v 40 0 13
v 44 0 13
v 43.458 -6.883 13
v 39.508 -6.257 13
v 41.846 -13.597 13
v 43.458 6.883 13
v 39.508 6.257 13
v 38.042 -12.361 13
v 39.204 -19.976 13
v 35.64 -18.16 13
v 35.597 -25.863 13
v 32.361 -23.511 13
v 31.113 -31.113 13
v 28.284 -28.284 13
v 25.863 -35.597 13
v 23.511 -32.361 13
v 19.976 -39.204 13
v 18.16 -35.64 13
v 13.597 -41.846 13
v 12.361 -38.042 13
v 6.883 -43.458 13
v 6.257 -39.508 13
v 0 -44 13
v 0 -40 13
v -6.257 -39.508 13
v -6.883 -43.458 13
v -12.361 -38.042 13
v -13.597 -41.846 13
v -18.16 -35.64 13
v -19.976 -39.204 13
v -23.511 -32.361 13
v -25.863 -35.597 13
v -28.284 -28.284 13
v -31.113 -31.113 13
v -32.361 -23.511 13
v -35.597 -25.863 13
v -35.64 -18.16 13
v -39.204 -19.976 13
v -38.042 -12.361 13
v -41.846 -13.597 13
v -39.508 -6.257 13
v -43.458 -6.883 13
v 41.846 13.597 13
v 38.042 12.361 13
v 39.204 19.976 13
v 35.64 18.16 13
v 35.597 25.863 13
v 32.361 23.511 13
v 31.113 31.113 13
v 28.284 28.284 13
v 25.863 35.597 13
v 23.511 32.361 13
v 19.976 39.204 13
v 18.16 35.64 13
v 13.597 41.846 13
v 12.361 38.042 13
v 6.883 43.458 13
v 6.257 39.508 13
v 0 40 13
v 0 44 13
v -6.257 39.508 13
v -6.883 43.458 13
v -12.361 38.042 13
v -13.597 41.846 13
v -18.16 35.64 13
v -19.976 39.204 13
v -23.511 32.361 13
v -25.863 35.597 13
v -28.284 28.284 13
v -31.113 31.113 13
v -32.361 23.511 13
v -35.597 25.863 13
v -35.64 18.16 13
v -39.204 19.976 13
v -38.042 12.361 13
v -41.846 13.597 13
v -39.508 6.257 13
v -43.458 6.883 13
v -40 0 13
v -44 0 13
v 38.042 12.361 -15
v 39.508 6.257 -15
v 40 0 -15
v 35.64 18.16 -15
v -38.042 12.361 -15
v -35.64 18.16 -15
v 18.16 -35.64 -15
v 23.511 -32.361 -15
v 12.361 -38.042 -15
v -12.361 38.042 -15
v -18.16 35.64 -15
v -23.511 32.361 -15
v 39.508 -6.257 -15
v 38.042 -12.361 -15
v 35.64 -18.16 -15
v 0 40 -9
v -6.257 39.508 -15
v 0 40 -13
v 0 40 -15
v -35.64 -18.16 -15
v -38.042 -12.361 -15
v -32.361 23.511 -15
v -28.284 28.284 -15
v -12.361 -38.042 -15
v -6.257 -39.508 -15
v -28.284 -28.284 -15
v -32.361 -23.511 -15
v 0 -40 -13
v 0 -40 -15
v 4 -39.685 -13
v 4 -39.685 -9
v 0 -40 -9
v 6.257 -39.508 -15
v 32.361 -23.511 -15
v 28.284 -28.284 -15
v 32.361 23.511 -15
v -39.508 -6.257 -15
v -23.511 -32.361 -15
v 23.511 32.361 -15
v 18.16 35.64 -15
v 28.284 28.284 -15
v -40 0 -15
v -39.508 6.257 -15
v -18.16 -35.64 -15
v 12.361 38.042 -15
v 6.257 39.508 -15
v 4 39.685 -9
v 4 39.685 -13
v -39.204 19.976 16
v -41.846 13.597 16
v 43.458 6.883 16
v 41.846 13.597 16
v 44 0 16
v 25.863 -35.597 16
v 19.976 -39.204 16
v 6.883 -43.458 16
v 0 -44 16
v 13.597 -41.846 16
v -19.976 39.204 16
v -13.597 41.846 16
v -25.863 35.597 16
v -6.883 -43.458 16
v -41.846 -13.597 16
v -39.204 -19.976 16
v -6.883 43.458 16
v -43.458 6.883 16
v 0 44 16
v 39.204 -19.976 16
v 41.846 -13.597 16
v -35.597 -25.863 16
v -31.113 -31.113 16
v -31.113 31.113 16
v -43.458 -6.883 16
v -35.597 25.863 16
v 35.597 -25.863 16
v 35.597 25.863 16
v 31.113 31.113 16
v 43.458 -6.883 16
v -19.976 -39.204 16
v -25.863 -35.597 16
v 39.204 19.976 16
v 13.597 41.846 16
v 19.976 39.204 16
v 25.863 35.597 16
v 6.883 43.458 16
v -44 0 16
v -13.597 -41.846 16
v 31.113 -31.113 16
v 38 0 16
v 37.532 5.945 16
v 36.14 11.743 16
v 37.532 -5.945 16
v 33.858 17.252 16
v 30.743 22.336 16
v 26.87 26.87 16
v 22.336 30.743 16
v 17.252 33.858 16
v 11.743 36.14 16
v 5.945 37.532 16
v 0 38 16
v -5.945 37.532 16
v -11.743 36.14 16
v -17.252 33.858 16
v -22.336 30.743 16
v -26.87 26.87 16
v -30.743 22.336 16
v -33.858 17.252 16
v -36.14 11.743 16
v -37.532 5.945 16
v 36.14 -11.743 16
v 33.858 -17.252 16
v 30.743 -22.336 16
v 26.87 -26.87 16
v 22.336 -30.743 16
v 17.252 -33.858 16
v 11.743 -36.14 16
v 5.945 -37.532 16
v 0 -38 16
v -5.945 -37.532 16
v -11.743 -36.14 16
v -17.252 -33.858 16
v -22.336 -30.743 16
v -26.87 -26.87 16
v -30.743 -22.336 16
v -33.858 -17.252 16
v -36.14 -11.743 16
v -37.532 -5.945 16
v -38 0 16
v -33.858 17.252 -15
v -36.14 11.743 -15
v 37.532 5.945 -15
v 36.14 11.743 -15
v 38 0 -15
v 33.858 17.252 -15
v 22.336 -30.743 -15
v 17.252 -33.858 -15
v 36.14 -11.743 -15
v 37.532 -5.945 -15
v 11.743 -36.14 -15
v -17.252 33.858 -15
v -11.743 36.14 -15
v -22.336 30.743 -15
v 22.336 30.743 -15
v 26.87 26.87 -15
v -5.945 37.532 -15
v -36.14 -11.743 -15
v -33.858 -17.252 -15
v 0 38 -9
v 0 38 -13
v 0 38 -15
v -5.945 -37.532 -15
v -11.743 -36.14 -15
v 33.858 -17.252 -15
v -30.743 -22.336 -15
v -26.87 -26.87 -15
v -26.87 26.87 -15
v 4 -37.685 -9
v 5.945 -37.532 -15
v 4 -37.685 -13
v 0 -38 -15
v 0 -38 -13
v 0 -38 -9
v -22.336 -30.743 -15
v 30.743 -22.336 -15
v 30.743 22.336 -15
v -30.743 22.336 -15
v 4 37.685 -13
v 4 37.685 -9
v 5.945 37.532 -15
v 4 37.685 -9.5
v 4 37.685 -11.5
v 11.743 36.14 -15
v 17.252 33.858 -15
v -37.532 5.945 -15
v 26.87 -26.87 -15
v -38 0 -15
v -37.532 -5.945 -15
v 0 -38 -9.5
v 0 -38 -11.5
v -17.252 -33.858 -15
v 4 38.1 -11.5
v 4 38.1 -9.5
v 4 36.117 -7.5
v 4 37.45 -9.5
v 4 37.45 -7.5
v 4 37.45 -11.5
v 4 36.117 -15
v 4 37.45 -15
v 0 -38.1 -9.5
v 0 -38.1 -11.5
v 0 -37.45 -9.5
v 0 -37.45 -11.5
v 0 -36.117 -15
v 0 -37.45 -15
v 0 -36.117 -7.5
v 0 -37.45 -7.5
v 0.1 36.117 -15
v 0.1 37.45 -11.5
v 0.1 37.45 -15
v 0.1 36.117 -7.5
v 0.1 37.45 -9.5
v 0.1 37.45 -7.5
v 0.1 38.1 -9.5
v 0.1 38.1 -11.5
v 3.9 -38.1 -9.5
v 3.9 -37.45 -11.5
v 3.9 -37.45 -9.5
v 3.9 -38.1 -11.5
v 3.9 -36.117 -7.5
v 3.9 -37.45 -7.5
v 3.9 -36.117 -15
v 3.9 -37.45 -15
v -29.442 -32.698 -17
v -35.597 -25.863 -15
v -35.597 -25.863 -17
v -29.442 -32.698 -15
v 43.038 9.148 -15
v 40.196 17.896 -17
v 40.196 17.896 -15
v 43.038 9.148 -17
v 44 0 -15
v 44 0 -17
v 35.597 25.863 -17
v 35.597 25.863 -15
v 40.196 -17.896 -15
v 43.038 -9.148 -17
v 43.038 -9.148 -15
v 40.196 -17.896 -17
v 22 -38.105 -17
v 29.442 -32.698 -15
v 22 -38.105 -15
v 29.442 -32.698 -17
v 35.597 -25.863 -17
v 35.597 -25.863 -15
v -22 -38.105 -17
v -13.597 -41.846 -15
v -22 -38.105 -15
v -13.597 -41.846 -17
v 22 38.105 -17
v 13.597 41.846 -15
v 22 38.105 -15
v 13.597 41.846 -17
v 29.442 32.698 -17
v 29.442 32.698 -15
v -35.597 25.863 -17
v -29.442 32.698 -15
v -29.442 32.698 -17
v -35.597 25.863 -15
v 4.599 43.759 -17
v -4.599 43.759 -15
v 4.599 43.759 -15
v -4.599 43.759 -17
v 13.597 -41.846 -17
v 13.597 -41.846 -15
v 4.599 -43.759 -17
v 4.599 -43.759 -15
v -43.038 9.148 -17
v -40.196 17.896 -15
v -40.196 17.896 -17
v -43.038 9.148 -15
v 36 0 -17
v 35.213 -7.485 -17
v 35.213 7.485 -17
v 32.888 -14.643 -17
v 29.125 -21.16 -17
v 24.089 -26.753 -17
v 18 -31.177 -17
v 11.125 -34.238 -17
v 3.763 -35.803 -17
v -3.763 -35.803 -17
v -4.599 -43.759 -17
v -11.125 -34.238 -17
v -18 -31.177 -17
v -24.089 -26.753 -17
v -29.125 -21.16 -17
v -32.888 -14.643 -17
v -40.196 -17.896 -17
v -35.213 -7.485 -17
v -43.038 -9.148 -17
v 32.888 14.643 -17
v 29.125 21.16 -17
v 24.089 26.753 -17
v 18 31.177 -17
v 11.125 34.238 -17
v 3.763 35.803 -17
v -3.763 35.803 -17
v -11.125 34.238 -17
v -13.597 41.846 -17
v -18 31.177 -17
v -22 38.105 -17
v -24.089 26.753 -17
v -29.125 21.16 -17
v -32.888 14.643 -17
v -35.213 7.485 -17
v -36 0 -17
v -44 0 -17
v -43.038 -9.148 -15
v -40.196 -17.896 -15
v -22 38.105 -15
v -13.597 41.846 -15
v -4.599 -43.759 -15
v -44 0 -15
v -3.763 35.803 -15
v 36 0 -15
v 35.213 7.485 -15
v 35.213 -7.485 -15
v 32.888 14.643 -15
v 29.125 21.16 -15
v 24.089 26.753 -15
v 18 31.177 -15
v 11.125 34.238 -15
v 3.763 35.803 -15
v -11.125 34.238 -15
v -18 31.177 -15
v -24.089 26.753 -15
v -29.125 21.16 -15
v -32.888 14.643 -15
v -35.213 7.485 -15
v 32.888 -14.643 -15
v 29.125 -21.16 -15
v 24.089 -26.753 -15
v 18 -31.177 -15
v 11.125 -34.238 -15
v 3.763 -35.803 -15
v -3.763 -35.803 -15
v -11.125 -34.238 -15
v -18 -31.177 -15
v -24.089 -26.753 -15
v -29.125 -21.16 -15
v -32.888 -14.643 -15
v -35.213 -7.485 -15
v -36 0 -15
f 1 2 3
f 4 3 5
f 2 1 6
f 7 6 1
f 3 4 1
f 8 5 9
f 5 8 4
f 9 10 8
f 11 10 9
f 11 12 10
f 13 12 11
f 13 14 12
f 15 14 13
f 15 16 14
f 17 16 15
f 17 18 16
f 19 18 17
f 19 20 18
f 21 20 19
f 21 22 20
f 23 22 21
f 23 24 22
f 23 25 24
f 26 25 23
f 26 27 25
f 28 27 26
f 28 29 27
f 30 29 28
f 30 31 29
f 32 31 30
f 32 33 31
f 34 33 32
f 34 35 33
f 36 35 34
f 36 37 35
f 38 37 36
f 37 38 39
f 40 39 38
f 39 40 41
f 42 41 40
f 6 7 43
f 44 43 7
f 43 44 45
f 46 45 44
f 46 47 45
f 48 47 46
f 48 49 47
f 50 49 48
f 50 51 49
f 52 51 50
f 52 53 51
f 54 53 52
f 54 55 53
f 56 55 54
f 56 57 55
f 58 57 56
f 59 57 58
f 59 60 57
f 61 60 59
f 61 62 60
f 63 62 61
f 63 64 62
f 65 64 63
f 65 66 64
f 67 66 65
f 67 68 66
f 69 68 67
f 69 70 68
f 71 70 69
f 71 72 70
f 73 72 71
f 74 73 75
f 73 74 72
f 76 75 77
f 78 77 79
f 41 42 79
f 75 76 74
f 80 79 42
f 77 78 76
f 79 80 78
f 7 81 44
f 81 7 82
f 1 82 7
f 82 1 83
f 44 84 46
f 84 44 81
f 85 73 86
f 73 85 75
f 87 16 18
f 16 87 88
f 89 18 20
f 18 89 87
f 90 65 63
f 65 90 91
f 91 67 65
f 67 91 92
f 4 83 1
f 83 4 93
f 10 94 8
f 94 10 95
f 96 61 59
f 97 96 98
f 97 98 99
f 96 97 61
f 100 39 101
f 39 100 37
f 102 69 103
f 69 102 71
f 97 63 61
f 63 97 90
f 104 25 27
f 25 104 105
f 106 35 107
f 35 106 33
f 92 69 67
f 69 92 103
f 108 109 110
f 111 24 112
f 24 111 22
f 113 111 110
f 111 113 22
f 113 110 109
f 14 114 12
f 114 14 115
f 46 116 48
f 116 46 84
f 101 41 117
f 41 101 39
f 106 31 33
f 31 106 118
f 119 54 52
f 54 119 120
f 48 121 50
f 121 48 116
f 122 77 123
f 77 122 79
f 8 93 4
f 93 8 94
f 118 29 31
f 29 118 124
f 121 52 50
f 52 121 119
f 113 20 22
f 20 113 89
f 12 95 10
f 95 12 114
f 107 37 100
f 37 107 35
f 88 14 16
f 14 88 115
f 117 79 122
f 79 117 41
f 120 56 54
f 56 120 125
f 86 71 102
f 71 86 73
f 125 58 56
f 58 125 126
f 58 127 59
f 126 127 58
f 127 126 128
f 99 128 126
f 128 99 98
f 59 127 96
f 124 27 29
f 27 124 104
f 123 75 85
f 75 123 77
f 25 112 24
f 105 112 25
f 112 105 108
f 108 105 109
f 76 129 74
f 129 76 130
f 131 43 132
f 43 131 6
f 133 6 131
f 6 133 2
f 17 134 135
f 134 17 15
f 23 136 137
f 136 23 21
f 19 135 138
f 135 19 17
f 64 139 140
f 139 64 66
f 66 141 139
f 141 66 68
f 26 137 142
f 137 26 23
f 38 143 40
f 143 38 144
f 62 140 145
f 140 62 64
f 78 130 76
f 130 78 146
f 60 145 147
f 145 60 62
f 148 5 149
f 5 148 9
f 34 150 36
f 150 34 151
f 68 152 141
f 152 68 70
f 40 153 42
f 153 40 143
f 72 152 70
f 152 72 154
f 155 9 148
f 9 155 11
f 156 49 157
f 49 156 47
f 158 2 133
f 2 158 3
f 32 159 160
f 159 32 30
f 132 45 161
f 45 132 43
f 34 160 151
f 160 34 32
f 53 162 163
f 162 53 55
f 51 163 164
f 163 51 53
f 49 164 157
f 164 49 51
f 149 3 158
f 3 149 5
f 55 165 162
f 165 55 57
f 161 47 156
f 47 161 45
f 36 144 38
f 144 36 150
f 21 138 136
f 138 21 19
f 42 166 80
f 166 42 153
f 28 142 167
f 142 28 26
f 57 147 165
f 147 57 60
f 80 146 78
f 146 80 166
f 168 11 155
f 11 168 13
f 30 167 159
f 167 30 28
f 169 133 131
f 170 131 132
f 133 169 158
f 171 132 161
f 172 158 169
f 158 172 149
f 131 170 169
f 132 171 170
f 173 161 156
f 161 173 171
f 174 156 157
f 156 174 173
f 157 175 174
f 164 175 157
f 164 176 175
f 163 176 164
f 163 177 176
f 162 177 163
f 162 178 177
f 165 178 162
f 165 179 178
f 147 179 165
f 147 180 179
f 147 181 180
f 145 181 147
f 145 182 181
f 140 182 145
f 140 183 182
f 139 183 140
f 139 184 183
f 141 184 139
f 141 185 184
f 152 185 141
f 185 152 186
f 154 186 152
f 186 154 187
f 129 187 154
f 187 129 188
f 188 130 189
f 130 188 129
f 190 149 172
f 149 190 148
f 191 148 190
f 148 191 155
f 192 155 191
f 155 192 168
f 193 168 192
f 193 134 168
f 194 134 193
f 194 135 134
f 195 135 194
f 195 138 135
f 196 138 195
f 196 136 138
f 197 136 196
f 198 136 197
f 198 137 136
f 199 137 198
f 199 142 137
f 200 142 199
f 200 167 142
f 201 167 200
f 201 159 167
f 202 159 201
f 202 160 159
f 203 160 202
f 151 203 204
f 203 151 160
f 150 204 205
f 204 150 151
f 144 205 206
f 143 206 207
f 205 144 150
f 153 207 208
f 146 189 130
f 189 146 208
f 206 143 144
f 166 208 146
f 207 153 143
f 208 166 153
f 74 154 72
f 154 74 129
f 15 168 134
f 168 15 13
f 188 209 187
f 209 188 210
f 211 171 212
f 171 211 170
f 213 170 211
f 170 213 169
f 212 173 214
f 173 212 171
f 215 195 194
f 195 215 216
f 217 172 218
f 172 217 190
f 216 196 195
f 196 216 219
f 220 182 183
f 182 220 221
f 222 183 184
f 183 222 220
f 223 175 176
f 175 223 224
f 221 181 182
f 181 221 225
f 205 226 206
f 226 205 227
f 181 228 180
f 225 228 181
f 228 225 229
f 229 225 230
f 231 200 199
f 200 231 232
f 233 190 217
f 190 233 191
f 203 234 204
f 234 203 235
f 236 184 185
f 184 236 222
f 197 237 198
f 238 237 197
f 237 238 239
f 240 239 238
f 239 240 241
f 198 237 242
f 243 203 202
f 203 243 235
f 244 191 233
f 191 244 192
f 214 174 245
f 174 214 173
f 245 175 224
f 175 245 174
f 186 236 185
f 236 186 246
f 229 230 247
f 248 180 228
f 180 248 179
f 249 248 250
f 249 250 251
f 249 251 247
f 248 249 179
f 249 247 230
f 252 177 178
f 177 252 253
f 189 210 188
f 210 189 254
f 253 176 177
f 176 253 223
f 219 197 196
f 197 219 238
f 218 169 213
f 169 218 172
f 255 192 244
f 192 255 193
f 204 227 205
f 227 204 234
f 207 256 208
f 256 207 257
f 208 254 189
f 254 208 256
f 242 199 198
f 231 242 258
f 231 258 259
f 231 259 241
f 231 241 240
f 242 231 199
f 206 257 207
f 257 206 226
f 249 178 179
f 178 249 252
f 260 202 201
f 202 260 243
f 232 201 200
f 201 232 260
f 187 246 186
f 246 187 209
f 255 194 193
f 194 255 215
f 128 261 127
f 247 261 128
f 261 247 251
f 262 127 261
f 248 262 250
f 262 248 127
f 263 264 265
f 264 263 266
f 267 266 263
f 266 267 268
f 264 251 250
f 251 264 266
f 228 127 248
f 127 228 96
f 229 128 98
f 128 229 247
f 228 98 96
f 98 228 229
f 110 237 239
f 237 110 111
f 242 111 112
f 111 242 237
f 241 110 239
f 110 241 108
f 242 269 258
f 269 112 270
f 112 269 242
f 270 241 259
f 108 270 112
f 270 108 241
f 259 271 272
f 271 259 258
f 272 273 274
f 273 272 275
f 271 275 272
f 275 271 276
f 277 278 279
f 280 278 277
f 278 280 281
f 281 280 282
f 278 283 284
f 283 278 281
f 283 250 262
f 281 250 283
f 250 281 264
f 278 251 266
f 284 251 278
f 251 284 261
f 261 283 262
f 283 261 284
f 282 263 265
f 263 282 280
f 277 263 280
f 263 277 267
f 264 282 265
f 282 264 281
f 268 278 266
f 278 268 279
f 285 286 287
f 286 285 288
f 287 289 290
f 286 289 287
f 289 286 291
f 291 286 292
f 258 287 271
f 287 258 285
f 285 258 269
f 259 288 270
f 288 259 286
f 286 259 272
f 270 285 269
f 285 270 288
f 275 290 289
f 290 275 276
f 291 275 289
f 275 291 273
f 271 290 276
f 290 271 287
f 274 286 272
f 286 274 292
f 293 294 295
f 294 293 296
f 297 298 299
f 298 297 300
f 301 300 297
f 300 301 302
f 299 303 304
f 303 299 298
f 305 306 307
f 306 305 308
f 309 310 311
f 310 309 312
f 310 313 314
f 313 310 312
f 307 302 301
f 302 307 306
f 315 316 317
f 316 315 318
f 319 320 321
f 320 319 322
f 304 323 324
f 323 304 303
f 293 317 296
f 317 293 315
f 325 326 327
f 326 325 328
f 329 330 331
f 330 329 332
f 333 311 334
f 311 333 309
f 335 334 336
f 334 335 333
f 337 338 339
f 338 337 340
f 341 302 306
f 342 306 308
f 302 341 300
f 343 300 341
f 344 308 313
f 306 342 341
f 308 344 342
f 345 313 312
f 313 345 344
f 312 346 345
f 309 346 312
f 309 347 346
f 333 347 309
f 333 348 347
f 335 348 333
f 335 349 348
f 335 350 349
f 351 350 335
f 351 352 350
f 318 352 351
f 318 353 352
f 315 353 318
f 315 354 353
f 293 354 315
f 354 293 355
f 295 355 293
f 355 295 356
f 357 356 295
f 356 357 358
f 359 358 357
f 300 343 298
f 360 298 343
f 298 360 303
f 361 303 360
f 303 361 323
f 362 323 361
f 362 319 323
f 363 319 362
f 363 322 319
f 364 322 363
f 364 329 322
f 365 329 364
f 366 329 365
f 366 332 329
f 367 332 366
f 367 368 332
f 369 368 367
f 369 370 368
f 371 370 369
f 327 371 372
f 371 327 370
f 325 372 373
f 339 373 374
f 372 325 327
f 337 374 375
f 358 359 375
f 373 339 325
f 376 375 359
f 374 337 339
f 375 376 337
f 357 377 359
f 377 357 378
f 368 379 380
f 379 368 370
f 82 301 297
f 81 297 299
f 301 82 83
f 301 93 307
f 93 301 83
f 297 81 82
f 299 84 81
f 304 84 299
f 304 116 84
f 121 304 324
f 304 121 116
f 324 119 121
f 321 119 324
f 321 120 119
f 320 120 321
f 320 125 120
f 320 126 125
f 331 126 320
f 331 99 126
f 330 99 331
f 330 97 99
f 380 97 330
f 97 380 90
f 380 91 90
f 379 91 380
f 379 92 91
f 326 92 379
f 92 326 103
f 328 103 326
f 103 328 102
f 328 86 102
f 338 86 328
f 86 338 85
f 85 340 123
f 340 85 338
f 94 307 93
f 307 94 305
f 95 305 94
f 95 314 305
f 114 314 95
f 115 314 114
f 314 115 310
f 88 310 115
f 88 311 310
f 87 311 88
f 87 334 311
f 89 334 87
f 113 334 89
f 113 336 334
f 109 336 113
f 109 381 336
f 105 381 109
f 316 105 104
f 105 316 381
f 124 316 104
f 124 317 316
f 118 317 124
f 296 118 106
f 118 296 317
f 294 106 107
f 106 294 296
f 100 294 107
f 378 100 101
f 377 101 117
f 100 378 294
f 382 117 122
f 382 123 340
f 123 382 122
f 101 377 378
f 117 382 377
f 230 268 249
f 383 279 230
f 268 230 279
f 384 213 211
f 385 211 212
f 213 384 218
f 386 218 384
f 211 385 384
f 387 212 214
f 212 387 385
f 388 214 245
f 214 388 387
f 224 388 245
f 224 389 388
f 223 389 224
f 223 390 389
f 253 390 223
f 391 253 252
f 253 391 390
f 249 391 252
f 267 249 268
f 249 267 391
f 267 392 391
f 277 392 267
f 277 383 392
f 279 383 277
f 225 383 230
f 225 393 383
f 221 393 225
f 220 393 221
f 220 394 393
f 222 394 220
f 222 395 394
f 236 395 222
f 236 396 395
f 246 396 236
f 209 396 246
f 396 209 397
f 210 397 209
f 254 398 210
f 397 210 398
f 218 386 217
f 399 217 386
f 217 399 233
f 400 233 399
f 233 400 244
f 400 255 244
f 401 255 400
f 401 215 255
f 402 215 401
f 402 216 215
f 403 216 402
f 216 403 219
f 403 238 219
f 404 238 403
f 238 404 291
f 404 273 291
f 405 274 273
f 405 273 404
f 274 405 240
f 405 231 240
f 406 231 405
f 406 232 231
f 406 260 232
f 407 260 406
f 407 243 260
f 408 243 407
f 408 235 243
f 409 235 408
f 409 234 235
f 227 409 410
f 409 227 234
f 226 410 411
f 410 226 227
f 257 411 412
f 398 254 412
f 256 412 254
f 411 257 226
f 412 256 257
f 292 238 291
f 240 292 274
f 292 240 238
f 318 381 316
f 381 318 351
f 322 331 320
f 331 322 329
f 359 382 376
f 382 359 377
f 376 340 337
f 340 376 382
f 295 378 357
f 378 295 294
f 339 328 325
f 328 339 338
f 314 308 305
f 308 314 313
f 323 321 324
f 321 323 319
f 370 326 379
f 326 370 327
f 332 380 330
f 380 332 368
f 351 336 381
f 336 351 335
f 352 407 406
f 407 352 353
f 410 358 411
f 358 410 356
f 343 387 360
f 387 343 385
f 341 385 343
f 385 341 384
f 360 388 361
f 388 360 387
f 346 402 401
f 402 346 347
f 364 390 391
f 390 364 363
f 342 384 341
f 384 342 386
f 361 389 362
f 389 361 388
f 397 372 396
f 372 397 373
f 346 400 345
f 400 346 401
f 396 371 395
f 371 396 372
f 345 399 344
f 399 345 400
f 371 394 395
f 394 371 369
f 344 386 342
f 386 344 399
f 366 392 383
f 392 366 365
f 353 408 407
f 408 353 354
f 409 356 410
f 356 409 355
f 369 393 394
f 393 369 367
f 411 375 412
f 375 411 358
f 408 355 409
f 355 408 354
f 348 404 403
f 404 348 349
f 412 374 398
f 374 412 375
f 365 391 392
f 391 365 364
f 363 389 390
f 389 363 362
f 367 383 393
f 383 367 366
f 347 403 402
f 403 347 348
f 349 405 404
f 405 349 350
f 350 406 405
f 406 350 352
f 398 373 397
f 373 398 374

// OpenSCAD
// file: bolt.scad
rings = 6;
length = 30;
diammeter = 30;

thread_base_thickness = 5;
thread_width = 0.3;
thread_height = 2;
thread_end_thickness = 0.3;

N = 1000 * 0.1 * diammeter * 0.1 * rings;
module screw(r = rings, l = length, d = diammeter, tb = thread_base_thickness, tw = thread_width, th = thread_height,
             tt = thread_end_thickness)
{
    ANGLE = 360 * r;
    color("lightgray")
    {
        for (i = [0:N])
        {

            hull()
            {
                translate([ d / 2 * cos(i * ANGLE / N), d / 2 * sin(i * ANGLE / N), i * l / N ])
                    rotate(a = 55, v = [ 0, 0, 1 ]) rotate(a = -135 + i * ANGLE / N, v = [ 0, 0, 1 ])
                        rotate(a = 90, v = [ 0, 1, 0 ]) linear_extrude(convexity = 2, height = thread_end_thickness)
                            polygon([ [ -tb / 2, 0 ], [ -tw / 2, th ], [ tw / 2, th ], [ tb / 2, 0 ] ]);

                translate([ d / 2 * cos((i + 1) * ANGLE / N), d / 2 * sin((i + 1) * ANGLE / N), (i + 1) * l / N ])
                    rotate(a = 55, v = [ 0, 0, 1 ]) rotate(a = -135 + i * ANGLE / N, v = [ 0, 0, 1 ])
                        rotate(a = 90, v = [ 0, 1, 0 ]) linear_extrude(convexity = 2, height = thread_end_thickness)
                            polygon([ [ -tb / 2, 0 ], [ -tw / 2, th ], [ tw / 2, th ], [ tb / 2, 0 ] ]);
            }
        }

        translate([ 0, 0, l / 2 ]) cylinder($fn = 100, h = l + 10, d1 = d + 0.2, d2 = d + 0.2, center = true);
    }
}
// main file
use <bolt.scad>
hole_radius = 40;
border_width = 4;
border_height = 2;
table_thickness = 30;
wall_thickness = 2;
male = true;
female = true;
screwed = false;
clip = true;
inner_radius = hole_radius - wall_thickness;
overflow = 0.1;

module _screwed(loose = 0) screw(r = 2, l = (table_thickness / 4), d = hole_radius * 2 - wall_thickness * 2 + loose * 2,
                                 tb = 1.5 + loose, tw = 0.5 + loose, th = 1.5 + loose, tt = 0.5 + loose);

if (female)
{
    difference()
    {
        difference()
        {
            cylinder(h = table_thickness + border_height, r = hole_radius + border_width, $fn = 40, center = true);
            cylinder(h = table_thickness + border_height + overflow, r = inner_radius, $fn = 40, center = true);
            translate([ 0, 0, 0 - border_height ]) difference()
            {
                cylinder(h = table_thickness, r = hole_radius + border_width + overflow, $fn = 40, center = true);
                cylinder(h = table_thickness, r = hole_radius, $fn = 40, center = true);
            };
        }
        if (screwed)
        {
            translate([ 0, 0, 0 - table_thickness / 2 - border_height / 2 ]) _screwed();
        }
        else
        {
            if (clip)
            {
                translate([ 0, inner_radius - wall_thickness, 0 - table_thickness / 2 + wall_thickness ]) color("red")
                    cube(size = wall_thickness * 2);
                translate([ 0, 0 - inner_radius - wall_thickness, 0 - table_thickness / 2 + wall_thickness ])
                    color("red") cube(size = wall_thickness * 2);
            }
        }
    }
}

module _clip() {
    union() {
        translate([ 0, wall_thickness-overflow, wall_thickness ])
            cube([ wall_thickness * 2 - overflow, wall_thickness - overflow, wall_thickness ]);
        translate([ 0, (wall_thickness - overflow * 3) * 1.5, 0 - wall_thickness ])
            cube([ wall_thickness * 2 - overflow, wall_thickness / 1.5, wall_thickness * 4 ]);
    }
  
}
if (male)
{
    difference()
    {
        translate([ 0, 0, 0 - border_height ]) union()
        {
            if (screwed)
            {
                translate([ 0, 0, 0 - table_thickness / 3 ]) _screwed(loose = 0.1);
            }
            else
            {
                if (clip)
                {
                    translate([ wall_thickness*2, inner_radius  +wall_thickness, 0 - table_thickness / 2 + border_height * 1.75 ])
                    {
                     rotate([0,0,180])color("red") _clip();
                    }
                    translate([ 0, 0 - inner_radius - wall_thickness, 0 - table_thickness / 2 + border_height * 1.75 ])
                    {
                      _clip();
                    }
                }
            }
            translate([ 0, 0, 0 - table_thickness / 2 ]) cylinder(h = border_height, r = hole_radius + border_width);
        }
        translate([ 0, 0, 0 - table_thickness + border_height ])
            cylinder(h = border_height * 1.75, r = hole_radius + border_width);

        cylinder(h = table_thickness * 2, r = inner_radius - wall_thickness, center = true);
    }
}
